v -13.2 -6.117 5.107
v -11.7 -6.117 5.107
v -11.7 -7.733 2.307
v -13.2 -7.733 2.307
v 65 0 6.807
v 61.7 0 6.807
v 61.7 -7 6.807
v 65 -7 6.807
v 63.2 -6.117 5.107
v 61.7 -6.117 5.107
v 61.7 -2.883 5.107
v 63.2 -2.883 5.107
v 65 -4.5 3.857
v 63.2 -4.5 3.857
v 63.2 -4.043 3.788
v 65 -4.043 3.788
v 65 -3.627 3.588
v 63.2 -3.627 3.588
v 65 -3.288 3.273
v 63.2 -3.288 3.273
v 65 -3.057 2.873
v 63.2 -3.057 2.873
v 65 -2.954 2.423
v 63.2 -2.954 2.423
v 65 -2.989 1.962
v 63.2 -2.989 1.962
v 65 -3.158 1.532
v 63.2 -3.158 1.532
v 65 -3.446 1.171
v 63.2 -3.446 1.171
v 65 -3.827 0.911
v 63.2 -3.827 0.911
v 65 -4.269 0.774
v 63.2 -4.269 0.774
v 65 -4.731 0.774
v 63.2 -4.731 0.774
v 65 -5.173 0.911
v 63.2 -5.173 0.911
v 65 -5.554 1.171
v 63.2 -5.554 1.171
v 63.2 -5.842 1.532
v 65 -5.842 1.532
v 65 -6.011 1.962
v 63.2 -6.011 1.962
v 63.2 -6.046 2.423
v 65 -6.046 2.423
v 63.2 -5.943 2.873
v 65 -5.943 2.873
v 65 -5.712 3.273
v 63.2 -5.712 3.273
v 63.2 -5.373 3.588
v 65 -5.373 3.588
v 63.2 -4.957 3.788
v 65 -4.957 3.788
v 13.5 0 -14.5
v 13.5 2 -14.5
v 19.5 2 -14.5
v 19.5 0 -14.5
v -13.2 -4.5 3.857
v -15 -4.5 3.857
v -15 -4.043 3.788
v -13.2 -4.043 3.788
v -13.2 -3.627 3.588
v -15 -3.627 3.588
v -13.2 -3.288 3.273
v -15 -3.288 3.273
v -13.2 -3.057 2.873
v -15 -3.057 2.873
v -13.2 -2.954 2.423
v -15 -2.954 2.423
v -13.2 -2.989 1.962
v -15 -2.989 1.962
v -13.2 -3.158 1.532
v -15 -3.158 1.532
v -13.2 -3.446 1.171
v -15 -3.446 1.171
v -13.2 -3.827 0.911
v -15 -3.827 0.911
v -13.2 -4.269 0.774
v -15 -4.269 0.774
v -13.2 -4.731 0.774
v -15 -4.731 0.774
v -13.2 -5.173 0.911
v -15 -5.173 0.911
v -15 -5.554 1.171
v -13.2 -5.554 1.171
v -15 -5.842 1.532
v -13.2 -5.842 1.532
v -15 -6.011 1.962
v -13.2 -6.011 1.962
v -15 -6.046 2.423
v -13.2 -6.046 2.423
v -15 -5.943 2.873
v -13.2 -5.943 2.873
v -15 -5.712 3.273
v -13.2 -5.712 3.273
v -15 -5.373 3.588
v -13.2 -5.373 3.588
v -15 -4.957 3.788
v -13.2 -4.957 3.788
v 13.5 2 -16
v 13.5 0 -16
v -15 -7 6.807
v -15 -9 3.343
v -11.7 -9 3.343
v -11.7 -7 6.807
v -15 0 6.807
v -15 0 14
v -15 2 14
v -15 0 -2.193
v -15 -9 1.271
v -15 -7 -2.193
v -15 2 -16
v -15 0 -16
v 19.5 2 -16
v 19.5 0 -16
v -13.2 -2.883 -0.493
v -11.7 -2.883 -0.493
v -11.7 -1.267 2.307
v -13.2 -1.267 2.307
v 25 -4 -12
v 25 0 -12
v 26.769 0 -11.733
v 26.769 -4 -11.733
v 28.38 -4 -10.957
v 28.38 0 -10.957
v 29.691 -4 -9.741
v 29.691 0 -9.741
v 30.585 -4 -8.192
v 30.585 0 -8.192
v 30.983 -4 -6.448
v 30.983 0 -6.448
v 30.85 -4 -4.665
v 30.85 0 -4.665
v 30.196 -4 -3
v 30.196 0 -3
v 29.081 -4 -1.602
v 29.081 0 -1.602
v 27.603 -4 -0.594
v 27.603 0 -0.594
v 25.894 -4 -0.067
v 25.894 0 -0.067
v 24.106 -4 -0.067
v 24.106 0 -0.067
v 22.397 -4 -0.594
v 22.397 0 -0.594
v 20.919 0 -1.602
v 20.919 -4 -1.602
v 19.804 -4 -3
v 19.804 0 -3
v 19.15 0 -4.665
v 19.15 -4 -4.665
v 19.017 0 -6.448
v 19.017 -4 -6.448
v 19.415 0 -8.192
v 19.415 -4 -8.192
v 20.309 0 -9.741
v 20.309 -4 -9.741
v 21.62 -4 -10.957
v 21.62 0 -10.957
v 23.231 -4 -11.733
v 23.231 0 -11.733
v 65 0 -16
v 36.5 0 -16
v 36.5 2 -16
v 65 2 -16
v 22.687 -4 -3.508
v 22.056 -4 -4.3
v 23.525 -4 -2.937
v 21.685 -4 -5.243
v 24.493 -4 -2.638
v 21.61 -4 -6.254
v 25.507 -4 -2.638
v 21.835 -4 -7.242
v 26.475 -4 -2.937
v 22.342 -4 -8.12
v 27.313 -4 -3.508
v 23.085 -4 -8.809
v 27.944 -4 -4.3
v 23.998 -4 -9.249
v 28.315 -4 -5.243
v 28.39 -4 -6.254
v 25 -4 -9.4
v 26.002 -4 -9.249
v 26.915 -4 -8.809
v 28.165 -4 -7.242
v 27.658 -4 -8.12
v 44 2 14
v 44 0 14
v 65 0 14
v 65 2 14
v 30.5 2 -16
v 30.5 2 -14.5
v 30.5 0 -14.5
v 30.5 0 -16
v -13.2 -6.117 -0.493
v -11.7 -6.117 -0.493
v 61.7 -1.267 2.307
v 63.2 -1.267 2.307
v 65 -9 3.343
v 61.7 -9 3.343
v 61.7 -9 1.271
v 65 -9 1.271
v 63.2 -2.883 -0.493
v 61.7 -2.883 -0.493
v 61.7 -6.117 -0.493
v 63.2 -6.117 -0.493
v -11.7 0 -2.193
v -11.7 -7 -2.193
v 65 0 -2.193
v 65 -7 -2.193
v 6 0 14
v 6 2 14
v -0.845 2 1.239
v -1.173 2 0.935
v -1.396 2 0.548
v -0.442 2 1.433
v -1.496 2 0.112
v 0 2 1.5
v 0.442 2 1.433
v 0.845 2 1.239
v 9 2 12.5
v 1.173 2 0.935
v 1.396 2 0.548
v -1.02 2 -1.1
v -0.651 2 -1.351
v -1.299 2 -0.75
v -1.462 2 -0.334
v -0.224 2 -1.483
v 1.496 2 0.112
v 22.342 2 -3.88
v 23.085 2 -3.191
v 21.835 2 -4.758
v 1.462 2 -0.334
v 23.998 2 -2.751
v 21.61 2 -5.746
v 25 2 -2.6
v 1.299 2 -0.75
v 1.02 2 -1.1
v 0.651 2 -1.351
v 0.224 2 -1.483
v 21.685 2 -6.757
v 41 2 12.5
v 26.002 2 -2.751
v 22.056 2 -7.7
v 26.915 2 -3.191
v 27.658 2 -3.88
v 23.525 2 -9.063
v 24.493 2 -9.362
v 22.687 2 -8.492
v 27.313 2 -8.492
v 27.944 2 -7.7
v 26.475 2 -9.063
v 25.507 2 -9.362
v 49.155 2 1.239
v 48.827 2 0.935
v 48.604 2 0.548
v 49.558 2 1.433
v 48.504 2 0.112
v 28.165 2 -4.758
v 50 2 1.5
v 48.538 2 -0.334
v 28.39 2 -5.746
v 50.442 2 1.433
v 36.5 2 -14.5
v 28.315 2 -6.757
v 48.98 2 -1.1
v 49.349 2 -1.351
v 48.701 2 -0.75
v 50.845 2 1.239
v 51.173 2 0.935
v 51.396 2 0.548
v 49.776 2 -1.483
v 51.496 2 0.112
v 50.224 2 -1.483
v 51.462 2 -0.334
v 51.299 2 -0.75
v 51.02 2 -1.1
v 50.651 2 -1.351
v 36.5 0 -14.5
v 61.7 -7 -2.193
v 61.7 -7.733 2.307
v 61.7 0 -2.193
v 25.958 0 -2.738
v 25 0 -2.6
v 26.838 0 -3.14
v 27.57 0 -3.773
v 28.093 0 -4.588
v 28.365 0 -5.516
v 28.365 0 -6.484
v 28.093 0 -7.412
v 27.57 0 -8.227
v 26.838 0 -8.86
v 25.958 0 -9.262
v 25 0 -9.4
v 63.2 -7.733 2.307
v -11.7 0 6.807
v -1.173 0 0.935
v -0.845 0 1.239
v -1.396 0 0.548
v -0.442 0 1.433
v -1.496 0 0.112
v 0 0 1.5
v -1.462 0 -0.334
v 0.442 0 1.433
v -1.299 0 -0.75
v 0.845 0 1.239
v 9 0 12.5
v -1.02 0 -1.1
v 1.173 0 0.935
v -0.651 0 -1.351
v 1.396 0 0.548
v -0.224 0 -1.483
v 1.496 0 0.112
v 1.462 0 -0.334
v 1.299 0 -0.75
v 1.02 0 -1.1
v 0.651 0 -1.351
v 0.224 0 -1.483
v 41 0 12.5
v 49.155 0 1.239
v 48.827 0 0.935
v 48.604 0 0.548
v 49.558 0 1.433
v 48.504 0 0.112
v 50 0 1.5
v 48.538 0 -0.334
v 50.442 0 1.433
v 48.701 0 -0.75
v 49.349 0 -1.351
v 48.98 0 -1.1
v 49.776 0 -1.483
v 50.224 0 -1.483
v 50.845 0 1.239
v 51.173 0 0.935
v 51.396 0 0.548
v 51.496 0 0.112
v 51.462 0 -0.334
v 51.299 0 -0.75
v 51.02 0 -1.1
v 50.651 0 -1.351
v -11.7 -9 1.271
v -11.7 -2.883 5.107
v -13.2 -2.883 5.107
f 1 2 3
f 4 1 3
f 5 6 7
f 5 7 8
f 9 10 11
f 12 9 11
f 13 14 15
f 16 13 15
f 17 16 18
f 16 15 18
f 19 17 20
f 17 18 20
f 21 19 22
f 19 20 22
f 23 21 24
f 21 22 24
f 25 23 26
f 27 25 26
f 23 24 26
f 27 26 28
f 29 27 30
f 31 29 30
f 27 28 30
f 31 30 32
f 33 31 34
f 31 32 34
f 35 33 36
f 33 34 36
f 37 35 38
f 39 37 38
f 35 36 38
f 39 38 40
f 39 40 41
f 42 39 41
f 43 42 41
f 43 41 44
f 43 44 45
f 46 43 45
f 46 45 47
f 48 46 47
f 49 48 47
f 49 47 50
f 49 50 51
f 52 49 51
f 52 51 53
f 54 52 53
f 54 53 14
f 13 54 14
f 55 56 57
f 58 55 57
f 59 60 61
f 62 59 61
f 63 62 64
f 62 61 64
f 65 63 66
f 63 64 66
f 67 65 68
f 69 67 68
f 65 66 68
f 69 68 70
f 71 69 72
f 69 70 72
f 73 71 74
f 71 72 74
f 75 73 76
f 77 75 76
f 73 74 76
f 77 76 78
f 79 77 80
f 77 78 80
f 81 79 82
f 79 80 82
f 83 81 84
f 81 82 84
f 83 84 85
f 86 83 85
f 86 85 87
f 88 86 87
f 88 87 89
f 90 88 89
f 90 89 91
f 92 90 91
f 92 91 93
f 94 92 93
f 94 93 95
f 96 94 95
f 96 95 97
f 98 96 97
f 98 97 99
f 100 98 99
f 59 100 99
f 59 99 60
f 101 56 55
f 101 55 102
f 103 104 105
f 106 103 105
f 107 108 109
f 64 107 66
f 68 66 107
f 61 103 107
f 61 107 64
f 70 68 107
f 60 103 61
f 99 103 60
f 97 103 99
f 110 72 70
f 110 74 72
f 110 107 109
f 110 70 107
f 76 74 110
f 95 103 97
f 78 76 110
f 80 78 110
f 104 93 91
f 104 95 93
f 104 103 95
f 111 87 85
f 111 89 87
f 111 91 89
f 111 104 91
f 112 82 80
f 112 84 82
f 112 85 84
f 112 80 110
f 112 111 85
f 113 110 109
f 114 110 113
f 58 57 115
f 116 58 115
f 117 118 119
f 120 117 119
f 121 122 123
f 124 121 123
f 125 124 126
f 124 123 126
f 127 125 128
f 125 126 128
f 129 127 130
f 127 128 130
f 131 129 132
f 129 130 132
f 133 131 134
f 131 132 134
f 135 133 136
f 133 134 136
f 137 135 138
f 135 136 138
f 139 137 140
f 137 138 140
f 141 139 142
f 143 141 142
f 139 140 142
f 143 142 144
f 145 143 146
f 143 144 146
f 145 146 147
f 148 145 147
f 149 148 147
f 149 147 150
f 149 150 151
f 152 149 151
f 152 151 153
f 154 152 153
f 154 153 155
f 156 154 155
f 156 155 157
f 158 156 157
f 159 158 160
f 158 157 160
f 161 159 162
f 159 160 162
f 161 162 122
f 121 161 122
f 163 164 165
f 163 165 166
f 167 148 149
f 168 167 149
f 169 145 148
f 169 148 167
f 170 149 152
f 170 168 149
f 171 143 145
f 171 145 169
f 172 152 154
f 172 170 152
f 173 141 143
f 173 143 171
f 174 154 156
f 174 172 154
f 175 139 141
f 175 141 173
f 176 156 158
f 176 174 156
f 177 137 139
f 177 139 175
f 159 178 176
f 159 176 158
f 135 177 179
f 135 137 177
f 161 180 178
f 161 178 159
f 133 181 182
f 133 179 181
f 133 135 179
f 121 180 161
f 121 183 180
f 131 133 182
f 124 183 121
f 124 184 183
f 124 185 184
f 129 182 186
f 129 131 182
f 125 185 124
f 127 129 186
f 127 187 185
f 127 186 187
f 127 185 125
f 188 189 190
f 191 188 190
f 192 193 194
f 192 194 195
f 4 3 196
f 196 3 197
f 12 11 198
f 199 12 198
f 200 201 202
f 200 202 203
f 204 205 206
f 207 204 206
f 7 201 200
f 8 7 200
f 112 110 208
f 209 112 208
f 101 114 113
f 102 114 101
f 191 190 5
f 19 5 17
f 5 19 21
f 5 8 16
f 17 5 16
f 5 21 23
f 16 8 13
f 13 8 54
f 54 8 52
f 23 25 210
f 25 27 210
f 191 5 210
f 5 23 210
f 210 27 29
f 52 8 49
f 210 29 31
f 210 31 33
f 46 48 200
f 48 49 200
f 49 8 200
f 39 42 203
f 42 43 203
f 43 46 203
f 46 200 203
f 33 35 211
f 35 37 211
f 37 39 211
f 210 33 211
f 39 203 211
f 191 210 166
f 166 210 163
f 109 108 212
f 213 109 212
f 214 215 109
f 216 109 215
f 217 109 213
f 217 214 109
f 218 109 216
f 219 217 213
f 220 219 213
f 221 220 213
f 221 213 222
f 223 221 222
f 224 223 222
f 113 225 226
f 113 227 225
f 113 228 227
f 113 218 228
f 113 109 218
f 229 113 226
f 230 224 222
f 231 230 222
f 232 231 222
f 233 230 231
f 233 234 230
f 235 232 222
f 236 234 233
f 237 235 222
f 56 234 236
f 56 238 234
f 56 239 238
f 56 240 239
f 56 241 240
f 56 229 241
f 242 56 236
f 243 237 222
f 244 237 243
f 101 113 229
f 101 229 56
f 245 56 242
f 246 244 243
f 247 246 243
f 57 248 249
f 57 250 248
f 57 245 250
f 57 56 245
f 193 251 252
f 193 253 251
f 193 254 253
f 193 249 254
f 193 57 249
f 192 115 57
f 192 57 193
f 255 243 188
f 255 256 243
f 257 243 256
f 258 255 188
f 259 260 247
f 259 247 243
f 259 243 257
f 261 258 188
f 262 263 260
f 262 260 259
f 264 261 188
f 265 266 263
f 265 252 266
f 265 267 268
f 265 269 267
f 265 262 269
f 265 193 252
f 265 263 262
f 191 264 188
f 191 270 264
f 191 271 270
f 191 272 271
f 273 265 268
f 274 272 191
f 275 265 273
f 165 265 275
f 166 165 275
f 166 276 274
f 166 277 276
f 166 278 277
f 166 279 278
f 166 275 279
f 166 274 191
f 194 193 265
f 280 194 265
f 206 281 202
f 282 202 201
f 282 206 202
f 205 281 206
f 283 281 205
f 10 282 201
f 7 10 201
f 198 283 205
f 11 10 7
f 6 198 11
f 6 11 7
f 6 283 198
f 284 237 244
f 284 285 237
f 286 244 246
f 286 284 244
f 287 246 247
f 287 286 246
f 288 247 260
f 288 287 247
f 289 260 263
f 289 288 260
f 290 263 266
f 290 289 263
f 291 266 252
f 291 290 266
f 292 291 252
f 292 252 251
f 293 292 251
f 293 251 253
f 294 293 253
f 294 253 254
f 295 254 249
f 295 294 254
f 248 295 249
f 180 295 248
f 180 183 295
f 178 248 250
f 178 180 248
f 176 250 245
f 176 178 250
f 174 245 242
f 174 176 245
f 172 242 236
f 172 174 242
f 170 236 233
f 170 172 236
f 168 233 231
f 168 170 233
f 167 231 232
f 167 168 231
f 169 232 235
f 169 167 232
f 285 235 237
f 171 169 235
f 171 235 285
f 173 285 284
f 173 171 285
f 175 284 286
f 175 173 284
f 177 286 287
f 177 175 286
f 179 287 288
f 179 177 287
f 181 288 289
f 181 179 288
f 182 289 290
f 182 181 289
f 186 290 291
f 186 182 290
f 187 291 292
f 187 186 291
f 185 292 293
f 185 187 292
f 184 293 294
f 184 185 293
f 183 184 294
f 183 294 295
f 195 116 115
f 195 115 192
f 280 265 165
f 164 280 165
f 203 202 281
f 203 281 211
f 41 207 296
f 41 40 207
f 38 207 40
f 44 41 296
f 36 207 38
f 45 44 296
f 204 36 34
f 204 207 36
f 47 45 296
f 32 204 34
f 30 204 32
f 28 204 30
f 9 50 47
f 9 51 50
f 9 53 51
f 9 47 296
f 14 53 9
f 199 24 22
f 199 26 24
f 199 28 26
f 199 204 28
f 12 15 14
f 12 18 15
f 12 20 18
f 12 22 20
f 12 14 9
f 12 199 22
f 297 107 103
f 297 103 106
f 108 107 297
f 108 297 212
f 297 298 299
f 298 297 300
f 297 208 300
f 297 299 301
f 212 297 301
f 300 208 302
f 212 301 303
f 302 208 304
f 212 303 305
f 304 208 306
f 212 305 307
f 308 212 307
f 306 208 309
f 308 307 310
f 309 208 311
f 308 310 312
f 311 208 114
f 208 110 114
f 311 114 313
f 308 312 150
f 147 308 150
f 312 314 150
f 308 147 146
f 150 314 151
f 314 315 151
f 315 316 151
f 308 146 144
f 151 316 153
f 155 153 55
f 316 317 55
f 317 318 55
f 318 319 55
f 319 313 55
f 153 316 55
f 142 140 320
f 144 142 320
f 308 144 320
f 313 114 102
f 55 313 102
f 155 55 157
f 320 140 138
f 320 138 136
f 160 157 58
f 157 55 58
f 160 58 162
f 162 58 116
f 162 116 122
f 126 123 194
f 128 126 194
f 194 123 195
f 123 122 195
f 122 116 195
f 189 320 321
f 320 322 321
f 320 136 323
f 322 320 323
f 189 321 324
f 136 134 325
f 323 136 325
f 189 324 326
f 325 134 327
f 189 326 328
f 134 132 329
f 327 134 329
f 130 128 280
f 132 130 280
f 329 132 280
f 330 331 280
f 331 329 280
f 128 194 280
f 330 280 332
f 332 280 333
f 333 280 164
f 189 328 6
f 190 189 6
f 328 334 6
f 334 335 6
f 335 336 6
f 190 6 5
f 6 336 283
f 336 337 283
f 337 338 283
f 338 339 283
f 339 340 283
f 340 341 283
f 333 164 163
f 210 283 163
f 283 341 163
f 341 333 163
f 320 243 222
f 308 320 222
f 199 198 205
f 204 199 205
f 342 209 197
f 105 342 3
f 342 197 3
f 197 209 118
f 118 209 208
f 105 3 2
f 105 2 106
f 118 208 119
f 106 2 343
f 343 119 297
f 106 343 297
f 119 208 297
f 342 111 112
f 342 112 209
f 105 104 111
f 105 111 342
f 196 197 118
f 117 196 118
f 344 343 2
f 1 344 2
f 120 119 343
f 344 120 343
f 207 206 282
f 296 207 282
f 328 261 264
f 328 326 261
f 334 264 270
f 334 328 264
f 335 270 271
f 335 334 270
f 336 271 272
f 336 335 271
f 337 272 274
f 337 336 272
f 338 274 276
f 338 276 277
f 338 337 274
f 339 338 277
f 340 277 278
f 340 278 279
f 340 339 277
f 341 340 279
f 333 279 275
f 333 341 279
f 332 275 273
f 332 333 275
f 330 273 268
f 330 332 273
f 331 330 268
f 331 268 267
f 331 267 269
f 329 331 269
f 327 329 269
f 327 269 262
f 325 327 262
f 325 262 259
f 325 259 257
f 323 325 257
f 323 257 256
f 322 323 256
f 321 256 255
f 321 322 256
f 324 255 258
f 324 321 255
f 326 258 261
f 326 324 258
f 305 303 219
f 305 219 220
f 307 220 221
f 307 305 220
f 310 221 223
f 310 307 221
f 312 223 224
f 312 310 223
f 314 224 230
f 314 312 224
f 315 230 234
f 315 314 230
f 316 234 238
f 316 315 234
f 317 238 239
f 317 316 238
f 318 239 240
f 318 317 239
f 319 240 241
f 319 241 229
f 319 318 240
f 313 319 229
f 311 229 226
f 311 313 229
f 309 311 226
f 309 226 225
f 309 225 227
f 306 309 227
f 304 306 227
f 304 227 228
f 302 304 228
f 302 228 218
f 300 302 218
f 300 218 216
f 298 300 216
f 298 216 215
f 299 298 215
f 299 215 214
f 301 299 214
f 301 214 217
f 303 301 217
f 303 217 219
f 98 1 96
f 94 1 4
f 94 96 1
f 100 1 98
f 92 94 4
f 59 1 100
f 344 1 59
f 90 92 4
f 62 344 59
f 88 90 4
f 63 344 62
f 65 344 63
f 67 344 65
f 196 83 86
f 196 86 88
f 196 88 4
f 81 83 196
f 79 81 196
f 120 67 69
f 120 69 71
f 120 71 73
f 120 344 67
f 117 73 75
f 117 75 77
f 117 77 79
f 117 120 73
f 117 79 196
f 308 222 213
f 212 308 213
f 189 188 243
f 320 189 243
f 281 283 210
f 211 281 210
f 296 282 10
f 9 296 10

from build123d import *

# Parameters (mm, degrees)
SKETCH2_W             = 80
SKETCH2_H             = 30
SKETCH2_R             = 1.5
SKETCH2_R_2           = 3.4
BOSS_EXTRUDE1_DEPTH   = 2
SKETCH3_W             = 6
SKETCH3_H             = 1.5
BOSS_EXTRUDE2_DEPTH   = 9
SKETCH9_R             = 4
SKETCH9_R_2           = 1.5
BOSS_EXTRUDE4_DEPTH   = 7
SKETCH4_R             = 6
SKETCH4_R_2           = 3.4
BOSS_EXTRUDE3_DEPTH   = 4
SKETCH10_R            = 4
SKETCH10_R_2          = 1.5
CUT_EXTRUDE7_DEPTH    = 7
SKETCH11_W            = 6
SKETCH11_H            = 1.5
CUT_EXTRUDE8_DEPTH    = 11
SKETCH12_W            = 3.3
SKETCH12_H            = 9
BOSS_EXTRUDE5_DEPTH   = 9
CUT_EXTRUDE11_DEPTH   = 1.5
CUT_EXTRUDE12_DEPTH   = 1.5
SKETCH18_R            = 1.55
CUT_EXTRUDE13_DEPTH   = 81
CHAMFER1_SIZE         = 2
CHAMFER1_SIZE2        = 3.464101615
CHAMFER1_PART_2_SIZE  = 2
CHAMFER1_PART_2_SIZE2 = 3.464101615
CHAMFER1_PART_3_SIZE  = 2
CHAMFER1_PART_3_SIZE2 = 3.464101615
CHAMFER1_PART_4_SIZE  = 2
CHAMFER1_PART_4_SIZE2 = 3.464101615


with BuildPart() as part:
    # Sketch2 → Boss-Extrude1 (new body)
    with BuildSketch(Plane(origin=(0, 0, 0), x_dir=(1, 0, 0), z_dir=(0, 1, 0))):
        with Locations((25, 1)):
            Rectangle(SKETCH2_W, SKETCH2_H)
        with Locations(Location((0, 0, 0), (0, 0, 270))):  # turned: the seam where the file's is
            Circle(SKETCH2_R, mode=Mode.SUBTRACT)
        with Locations(Location((50, 0, 0), (0, 0, 270))):  # turned: the seam where the file's is
            Circle(SKETCH2_R, mode=Mode.SUBTRACT)
        with Locations(Location((25, 6, 0), (0, 0, 270))):  # turned: the seam where the file's is
            Circle(SKETCH2_R_2, mode=Mode.SUBTRACT)
    extrude(amount=BOSS_EXTRUDE1_DEPTH)

    # Sketch3 → Boss-Extrude2 (add)
    with BuildSketch(Plane(origin=(0, 2, 0), x_dir=(1, 0, 0), z_dir=(0, 1, 0))):
        Polygon((6, -14), (44, -14), (41, -12.5), (9, -12.5), align=None)
        with Locations((16.5, 15.25)):
            Rectangle(SKETCH3_W, SKETCH3_H)
        with Locations((33.5, 15.25)):
            Rectangle(SKETCH3_W, SKETCH3_H)
    extrude(amount=BOSS_EXTRUDE2_DEPTH)

    # Sketch9 → Boss-Extrude4 (add)
    with BuildSketch(Plane(origin=(0, 2, 0), x_dir=(1, 0, 0), z_dir=(0, 1, 0))):
        with Locations(Location((50, 0, 0), (0, 0, 90))):  # turned: the seam where the file's is
            Circle(SKETCH9_R)
        with Locations(Location((50, 0, 0), (0, 0, 270))):  # turned: the seam where the file's is
            Circle(SKETCH9_R_2, mode=Mode.SUBTRACT)
        with Locations(Location((0, 0, 0), (0, 0, 90))):  # turned: the seam where the file's is
            Circle(SKETCH9_R)
        with Locations(Location((0, 0, 0), (0, 0, 270))):  # turned: the seam where the file's is
            Circle(SKETCH9_R_2, mode=Mode.SUBTRACT)
    extrude(amount=BOSS_EXTRUDE4_DEPTH)

    # Sketch4 → Boss-Extrude3 (add)
    with BuildSketch(Plane.XZ):
        with Locations(Location((25, -6, 0), (0, 0, 270))):  # turned: the seam where the file's is
            Circle(SKETCH4_R)
        with Locations(Location((25, -6, 0), (0, 0, 270))):  # turned: the seam where the file's is
            Circle(SKETCH4_R_2, mode=Mode.SUBTRACT)
    extrude(amount=BOSS_EXTRUDE3_DEPTH)

    # Sketch10 → Cut-Extrude7 (cut)
    with BuildSketch(Plane(origin=(0, 9, 0), x_dir=(1, 0, 0), z_dir=(0, 1, 0))):
        with Locations((50, 0)):
            Circle(SKETCH10_R)
        with Locations(Location((50, 0, 0), (0, 0, 90))):  # turned: the seam where the file's is
            Circle(SKETCH10_R_2, mode=Mode.SUBTRACT)
        Circle(SKETCH10_R)
        with Locations(Location((0, 0, 0), (0, 0, 90))):  # turned: the seam where the file's is
            Circle(SKETCH10_R_2, mode=Mode.SUBTRACT)
    extrude(amount=-CUT_EXTRUDE7_DEPTH, mode=Mode.SUBTRACT)

    # Sketch11 → Cut-Extrude8 (cut)
    with BuildSketch(Plane(origin=(0, 11, 0), x_dir=(1, 0, 0), z_dir=(0, 1, 0))):
        with Locations((33.5, 15.25)):
            Rectangle(SKETCH11_W, SKETCH11_H)
        Polygon((9, -12.5), (6, -14), (44, -14), (41, -12.5), align=None)
        with Locations((16.5, 15.25)):
            Rectangle(SKETCH11_W, SKETCH11_H)
    extrude(amount=-CUT_EXTRUDE8_DEPTH, mode=Mode.SUBTRACT)

    # Sketch12 → Boss-Extrude5 (add)
    with BuildSketch(Plane.XZ):
        with Locations((-13.35, 2.307056314)):
            Rectangle(SKETCH12_W, SKETCH12_H)
        with Locations((63.35, 2.307056314)):
            Rectangle(SKETCH12_W, SKETCH12_H)
    extrude(amount=BOSS_EXTRUDE5_DEPTH)

    # Sketch15 → Cut-Extrude11 (cut)
    with BuildSketch(Plane(origin=(-11.7, 0, 0), x_dir=(0, 0, -1), z_dir=(1, 0, 0))):
        Polygon((-2.307056314, -1.266838493), (-5.107056314, -2.883419246), (-5.107056314, -6.116580754), (-2.307056314, -7.733161507), (0.492943686, -6.116580754), (0.492943686, -2.883419246), align=None)
    extrude(amount=-CUT_EXTRUDE11_DEPTH, mode=Mode.SUBTRACT)

    # Sketch16 → Cut-Extrude12 (cut)
    with BuildSketch(Plane.ZY.offset(-61.7)):
        Polygon((2.307056314, -1.266838493), (-0.492943686, -2.883419246), (-0.492943686, -6.116580754), (2.307056314, -7.733161507), (5.107056314, -6.116580754), (5.107056314, -2.883419246), align=None)
    extrude(amount=-CUT_EXTRUDE12_DEPTH, mode=Mode.SUBTRACT)

    # Sketch18 → Cut-Extrude13 (cut, through all)
    with BuildSketch(Plane.ZY.offset(15)):
        with Locations((2.307056314, -4.5)):
            Circle(SKETCH18_R)
    extrude(amount=-CUT_EXTRUDE13_DEPTH, mode=Mode.SUBTRACT)

    # Chamfer1
    chamfer1_edges = [part.edges().sort_by_distance(p)[0] for p in [
        (-13.35, -9, -2.192943686),
    ]]
    chamfer1_side = [part.faces().sort_by_distance(p)[0] for p in [
        (-13.35, -4.5, -2.192943686),
    ]]
    chamfer(chamfer1_edges, length=CHAMFER1_SIZE, length2=CHAMFER1_SIZE2, reference=chamfer1_side[0])

    # Chamfer1 part 2
    chamfer1_part_2_edges = [part.edges().sort_by_distance(p)[0] for p in [
        (-13.35, -9, 6.807056314),
    ]]
    chamfer1_part_2_side = [part.faces().sort_by_distance(p)[0] for p in [
        (-13.35, -4.5, 6.807056314),
    ]]
    chamfer(chamfer1_part_2_edges, length=CHAMFER1_PART_2_SIZE, length2=CHAMFER1_PART_2_SIZE2, reference=chamfer1_part_2_side[0])

    # Chamfer1 part 3
    chamfer1_part_3_edges = [part.edges().sort_by_distance(p)[0] for p in [
        (63.35, -9, 6.807056314),
    ]]
    chamfer1_part_3_side = [part.faces().sort_by_distance(p)[0] for p in [
        (63.35, -4.5, 6.807056314),
    ]]
    chamfer(chamfer1_part_3_edges, length=CHAMFER1_PART_3_SIZE, length2=CHAMFER1_PART_3_SIZE2, reference=chamfer1_part_3_side[0])

    # Chamfer1 part 4
    chamfer1_part_4_edges = [part.edges().sort_by_distance(p)[0] for p in [
        (63.35, -9, -2.192943686),
    ]]
    chamfer1_part_4_side = [part.faces().sort_by_distance(p)[0] for p in [
        (63.35, -4.5, -2.192943686),
    ]]
    chamfer(chamfer1_part_4_edges, length=CHAMFER1_PART_4_SIZE, length2=CHAMFER1_PART_4_SIZE2, reference=chamfer1_part_4_side[0])


solid = part.part
